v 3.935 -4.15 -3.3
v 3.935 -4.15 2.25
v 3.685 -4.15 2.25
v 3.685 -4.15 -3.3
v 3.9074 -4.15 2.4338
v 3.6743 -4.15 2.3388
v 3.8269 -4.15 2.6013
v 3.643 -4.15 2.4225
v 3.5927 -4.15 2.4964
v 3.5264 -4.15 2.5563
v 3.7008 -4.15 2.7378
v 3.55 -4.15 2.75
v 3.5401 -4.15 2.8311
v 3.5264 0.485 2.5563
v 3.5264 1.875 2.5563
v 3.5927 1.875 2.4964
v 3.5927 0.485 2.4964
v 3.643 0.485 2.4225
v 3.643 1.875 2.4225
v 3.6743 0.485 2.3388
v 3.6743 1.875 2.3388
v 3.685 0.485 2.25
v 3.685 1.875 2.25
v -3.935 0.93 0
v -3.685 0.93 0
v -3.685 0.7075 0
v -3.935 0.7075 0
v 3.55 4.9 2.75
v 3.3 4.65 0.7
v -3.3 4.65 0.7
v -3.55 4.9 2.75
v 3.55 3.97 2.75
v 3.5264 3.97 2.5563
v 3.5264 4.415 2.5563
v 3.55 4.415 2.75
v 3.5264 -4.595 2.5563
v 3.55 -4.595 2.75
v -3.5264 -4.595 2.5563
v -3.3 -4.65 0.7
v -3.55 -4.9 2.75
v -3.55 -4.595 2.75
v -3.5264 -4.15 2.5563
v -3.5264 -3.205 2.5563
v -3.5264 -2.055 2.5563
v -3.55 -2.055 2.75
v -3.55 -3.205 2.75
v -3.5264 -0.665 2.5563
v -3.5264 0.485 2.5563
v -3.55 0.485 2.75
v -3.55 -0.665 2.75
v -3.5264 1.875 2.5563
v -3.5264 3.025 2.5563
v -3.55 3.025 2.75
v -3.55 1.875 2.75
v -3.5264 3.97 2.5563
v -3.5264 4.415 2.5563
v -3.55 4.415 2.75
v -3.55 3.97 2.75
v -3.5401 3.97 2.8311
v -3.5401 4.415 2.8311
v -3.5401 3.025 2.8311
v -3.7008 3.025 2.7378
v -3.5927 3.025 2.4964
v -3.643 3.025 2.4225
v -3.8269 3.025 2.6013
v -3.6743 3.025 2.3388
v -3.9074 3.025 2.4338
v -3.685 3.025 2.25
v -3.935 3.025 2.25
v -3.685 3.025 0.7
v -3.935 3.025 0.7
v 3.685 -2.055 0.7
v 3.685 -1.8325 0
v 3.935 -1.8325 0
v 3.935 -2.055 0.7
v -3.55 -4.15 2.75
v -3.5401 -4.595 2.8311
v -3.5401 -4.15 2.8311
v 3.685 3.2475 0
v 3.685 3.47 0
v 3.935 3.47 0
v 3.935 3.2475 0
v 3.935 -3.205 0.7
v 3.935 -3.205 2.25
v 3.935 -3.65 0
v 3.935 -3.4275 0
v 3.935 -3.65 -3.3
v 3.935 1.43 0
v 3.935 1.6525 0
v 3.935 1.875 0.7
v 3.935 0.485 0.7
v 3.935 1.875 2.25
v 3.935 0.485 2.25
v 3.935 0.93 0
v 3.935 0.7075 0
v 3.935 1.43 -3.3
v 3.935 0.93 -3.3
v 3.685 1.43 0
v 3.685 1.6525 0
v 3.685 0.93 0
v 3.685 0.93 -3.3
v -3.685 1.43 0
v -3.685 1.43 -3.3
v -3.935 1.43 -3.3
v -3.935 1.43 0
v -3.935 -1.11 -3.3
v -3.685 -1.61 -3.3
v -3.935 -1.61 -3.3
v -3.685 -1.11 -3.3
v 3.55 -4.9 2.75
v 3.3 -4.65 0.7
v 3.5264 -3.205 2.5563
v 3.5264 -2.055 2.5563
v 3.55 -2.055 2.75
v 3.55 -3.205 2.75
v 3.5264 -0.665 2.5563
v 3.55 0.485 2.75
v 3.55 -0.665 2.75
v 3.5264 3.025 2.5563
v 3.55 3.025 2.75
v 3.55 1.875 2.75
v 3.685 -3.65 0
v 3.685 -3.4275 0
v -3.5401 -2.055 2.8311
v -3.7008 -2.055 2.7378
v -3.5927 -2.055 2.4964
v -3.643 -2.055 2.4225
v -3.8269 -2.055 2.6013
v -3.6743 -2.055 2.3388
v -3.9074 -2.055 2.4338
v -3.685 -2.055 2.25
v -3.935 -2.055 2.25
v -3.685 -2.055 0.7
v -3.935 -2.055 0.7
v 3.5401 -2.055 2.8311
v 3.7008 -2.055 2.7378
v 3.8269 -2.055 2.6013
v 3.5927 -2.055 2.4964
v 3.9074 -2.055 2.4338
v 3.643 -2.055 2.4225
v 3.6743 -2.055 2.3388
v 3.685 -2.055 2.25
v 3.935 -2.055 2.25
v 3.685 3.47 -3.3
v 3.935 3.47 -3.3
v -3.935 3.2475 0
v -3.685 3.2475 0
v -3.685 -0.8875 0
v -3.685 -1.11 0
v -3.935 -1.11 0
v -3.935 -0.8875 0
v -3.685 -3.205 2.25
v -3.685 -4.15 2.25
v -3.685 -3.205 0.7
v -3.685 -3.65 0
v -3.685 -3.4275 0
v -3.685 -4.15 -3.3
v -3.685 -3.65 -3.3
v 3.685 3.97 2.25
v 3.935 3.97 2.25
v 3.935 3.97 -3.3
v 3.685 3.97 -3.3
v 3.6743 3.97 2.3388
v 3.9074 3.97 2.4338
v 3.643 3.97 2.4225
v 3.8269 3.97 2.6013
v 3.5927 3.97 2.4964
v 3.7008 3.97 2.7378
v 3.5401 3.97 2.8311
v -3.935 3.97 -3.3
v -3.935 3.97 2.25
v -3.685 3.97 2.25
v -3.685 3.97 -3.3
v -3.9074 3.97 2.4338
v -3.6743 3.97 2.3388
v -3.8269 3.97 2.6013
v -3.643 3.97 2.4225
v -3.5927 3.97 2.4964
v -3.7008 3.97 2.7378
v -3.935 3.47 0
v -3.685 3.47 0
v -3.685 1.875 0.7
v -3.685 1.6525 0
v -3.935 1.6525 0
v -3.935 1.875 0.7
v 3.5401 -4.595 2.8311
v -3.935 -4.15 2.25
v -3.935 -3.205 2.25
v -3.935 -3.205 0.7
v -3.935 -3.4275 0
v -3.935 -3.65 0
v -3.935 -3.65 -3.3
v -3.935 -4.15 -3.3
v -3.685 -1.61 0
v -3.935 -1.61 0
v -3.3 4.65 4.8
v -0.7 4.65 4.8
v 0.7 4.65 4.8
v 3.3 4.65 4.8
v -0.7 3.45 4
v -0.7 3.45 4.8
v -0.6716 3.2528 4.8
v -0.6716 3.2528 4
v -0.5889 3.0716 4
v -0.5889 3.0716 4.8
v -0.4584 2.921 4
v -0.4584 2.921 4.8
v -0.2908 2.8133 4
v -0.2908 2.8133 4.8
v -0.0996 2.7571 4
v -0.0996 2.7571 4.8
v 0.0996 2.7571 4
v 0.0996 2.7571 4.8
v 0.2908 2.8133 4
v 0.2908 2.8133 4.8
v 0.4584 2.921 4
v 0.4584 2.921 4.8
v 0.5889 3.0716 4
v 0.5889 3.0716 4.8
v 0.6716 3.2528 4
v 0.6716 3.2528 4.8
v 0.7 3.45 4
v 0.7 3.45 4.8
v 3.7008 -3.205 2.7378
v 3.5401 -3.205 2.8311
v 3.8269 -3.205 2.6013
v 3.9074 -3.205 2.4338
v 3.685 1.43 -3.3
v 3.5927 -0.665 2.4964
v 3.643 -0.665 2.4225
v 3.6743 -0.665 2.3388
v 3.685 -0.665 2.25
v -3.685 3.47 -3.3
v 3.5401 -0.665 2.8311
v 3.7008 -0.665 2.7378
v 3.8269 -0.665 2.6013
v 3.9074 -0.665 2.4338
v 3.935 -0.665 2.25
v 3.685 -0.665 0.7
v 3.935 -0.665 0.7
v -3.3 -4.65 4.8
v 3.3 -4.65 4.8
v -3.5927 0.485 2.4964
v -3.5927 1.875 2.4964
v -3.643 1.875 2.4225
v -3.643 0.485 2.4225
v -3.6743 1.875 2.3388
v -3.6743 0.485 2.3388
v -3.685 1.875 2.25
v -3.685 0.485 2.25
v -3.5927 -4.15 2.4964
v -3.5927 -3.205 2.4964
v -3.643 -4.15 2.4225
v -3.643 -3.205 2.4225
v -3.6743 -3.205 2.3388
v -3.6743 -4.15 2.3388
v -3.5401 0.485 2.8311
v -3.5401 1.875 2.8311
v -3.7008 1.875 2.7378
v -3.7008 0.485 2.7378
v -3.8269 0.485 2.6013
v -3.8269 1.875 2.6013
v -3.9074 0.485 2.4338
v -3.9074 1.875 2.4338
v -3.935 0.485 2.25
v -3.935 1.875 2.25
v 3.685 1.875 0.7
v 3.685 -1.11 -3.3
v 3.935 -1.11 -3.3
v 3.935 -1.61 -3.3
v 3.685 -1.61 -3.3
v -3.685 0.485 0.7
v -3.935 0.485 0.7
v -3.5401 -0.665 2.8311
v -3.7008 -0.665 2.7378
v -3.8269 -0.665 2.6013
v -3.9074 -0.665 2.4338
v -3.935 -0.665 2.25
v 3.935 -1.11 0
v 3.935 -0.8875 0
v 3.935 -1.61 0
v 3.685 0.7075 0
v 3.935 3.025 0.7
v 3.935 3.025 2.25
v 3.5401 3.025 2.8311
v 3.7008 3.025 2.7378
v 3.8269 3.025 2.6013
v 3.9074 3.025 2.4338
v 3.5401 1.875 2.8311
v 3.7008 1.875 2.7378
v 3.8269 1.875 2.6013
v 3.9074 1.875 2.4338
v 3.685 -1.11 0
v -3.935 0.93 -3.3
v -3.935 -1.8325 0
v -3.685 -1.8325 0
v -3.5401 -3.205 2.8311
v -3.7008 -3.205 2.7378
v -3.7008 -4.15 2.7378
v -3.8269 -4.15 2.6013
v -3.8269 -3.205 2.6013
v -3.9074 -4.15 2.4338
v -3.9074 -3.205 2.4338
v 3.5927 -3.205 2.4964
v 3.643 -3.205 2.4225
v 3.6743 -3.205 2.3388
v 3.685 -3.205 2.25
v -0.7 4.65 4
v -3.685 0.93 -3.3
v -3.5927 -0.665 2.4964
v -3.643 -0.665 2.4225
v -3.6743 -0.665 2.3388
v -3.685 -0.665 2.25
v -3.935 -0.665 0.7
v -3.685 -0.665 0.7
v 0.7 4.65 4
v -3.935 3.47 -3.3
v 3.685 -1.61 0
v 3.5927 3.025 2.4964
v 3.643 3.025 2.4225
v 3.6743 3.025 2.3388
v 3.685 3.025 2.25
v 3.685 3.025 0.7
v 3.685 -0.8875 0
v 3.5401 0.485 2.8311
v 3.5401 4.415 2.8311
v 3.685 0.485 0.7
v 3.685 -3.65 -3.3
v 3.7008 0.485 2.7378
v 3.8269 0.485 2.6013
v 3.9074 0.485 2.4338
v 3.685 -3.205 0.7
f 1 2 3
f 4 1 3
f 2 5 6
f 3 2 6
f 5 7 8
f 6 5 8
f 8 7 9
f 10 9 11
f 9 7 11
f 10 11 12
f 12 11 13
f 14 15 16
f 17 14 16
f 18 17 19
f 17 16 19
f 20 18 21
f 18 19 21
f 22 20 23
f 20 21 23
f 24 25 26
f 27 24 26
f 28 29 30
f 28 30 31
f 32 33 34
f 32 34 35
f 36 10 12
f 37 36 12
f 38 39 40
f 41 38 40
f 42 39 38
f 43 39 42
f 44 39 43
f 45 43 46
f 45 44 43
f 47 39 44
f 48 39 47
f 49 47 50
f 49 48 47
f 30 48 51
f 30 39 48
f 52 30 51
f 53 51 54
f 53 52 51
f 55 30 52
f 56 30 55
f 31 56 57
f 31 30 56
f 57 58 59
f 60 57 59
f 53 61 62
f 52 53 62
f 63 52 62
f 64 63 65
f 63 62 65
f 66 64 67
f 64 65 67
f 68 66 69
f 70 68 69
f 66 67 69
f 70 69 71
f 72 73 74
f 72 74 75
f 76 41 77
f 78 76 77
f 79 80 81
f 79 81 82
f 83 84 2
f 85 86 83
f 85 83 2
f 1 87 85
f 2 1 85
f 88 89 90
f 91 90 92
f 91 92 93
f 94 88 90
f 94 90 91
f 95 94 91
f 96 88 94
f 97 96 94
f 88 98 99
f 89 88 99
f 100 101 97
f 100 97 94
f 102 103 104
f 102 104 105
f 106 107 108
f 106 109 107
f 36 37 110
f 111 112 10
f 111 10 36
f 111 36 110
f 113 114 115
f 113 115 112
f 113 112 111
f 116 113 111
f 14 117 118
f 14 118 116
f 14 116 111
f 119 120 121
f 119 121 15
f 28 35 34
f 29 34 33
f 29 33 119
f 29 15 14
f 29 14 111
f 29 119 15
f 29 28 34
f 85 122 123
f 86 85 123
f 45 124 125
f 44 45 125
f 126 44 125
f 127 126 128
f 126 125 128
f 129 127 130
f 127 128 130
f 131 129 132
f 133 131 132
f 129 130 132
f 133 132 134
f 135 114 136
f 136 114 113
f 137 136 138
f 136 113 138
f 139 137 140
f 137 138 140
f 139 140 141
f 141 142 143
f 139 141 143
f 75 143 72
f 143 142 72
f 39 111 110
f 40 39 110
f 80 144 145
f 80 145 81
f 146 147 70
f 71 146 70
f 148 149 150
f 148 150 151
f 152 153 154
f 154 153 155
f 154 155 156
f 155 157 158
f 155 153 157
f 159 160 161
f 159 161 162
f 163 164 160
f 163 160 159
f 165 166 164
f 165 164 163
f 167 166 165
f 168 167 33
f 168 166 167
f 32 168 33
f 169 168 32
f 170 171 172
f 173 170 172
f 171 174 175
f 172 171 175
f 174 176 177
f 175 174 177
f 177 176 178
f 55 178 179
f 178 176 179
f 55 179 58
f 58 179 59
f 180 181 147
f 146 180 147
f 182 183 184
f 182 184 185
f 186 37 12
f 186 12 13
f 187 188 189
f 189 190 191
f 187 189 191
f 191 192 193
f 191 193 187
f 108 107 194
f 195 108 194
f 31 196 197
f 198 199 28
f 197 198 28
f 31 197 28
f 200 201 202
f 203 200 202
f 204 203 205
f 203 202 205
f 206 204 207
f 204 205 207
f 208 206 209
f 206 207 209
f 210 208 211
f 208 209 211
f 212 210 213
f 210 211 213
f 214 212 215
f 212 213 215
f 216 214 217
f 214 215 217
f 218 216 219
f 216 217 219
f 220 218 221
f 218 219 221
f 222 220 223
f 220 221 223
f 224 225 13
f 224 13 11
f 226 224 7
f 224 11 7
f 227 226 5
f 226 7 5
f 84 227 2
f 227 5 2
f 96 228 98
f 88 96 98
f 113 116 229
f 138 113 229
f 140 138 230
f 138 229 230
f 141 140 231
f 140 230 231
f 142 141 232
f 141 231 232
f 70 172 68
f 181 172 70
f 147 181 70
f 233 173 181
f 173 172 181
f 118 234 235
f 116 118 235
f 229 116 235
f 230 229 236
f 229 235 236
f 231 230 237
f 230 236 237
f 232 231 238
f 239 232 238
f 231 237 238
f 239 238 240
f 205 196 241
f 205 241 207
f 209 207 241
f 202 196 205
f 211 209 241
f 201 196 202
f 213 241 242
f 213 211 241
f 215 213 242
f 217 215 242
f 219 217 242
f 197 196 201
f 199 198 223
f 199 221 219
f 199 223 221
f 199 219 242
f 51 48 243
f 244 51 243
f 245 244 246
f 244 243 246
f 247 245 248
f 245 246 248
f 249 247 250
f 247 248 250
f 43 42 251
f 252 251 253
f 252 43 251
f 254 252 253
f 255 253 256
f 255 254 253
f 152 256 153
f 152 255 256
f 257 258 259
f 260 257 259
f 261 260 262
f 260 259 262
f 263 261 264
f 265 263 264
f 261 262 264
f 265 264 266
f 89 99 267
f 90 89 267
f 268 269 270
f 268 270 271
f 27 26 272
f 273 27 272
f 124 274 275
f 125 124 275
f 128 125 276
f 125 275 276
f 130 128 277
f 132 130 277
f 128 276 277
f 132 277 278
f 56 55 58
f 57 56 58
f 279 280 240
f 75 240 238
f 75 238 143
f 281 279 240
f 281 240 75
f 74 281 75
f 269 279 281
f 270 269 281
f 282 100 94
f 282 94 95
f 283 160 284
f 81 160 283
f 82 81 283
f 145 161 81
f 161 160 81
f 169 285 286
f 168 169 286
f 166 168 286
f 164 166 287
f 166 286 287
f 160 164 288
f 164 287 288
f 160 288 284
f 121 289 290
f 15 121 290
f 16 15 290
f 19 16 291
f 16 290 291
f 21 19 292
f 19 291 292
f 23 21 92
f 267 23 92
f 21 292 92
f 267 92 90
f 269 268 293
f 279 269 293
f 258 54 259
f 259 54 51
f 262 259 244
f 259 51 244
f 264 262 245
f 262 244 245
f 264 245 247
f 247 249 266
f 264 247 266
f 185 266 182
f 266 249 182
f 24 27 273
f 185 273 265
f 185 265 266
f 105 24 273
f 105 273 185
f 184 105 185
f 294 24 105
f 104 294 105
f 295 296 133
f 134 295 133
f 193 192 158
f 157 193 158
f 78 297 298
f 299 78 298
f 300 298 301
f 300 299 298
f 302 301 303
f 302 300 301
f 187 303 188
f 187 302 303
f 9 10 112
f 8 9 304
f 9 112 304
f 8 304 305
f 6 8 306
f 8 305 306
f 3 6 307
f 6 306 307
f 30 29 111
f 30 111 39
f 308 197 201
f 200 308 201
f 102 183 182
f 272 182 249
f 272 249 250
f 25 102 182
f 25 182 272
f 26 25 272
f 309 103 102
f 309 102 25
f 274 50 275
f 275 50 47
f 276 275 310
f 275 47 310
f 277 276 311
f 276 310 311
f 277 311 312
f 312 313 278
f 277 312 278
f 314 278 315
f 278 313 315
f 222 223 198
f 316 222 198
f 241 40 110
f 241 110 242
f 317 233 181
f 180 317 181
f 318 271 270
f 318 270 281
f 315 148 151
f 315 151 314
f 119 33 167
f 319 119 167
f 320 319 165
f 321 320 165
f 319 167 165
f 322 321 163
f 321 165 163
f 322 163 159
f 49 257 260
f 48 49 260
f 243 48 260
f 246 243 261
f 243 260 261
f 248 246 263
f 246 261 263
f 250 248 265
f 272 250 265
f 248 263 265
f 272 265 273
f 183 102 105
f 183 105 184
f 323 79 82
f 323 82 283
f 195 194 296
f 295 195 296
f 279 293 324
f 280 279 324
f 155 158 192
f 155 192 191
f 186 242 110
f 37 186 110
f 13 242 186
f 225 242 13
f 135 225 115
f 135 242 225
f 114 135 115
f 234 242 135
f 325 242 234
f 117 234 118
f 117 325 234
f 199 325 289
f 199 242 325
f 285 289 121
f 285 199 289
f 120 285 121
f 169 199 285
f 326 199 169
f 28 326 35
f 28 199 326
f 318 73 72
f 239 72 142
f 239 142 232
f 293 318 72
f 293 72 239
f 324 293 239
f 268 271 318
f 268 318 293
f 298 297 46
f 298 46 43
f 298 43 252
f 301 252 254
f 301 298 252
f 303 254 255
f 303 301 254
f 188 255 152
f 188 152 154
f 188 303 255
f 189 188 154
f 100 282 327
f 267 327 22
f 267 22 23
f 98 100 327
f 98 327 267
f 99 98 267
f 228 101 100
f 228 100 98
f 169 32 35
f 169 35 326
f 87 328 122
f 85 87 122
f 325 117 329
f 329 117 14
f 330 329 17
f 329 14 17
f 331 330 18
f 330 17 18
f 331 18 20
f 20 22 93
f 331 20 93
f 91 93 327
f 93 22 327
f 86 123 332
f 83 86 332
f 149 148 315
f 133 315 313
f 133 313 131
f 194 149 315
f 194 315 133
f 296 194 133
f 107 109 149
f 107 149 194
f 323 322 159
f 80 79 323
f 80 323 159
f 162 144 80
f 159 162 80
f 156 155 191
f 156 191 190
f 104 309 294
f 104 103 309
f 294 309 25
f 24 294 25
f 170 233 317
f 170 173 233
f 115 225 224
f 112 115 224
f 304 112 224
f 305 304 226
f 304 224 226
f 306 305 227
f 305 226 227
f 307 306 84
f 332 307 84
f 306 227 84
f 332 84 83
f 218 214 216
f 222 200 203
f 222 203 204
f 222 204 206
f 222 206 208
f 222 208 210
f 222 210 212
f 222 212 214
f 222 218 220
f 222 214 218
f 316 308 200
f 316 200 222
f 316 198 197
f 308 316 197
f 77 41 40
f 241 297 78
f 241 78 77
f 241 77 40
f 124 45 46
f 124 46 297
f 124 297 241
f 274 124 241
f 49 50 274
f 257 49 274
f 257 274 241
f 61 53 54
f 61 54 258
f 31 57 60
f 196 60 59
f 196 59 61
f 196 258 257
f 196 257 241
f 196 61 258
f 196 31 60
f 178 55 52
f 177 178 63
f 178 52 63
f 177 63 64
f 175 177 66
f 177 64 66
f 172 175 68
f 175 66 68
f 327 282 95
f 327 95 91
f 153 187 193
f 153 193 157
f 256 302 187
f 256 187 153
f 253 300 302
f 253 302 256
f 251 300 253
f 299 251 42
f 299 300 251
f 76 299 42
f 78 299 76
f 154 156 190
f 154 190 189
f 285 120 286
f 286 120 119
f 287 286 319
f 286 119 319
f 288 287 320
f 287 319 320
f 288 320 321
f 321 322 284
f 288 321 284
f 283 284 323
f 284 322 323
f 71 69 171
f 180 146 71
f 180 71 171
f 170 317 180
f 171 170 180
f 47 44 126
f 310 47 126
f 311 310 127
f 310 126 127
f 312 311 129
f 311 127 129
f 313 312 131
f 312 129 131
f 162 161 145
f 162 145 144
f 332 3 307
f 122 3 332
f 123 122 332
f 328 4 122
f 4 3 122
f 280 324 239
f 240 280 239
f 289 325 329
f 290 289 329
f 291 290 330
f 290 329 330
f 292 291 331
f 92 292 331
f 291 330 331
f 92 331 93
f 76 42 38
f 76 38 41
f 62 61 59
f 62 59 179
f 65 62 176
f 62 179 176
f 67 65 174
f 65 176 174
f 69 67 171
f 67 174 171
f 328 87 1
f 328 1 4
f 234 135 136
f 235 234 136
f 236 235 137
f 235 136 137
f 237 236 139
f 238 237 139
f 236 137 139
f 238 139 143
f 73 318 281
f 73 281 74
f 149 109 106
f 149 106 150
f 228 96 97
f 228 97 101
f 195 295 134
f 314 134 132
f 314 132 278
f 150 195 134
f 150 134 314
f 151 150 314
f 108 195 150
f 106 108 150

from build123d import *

# Parameters (mm, degrees)
BASIC_SHAPE_DEPTH              = 4.9
SIDE_PROFILE1_DEPTH            = 4.55
SIDE_PROFILE1_DEPTH_BACK       = 4.55
SIDE_PROFILE2_DEPTH            = 4.55
SIDE_PROFILE2_DEPTH_BACK       = 4.55
LOCATION_MARK_DEPTH            = 0.8
SKETCH6_W                      = 0.25
SKETCH6_H                      = 1.39
PIN_RELIEF_DEPTH               = 1.25
REMAINING_PINS_COUNT           = 4
REMAINING_PINS_PITCH           = 2.54
REMAINING_PINS_COPY_1_SKETCH_W = 0.25
REMAINING_PINS_COPY_1_SKETCH_H = 1.39
REMAINING_PINS_COPY_2_SKETCH_W = 0.25
REMAINING_PINS_COPY_2_SKETCH_H = 1.39
REMAINING_PINS_COPY_3_SKETCH_W = 0.25
REMAINING_PINS_COPY_3_SKETCH_H = 1.39
REMAINING_PINS_COPY_4_DEPTH    = 1.25
REMAINING_PINS_COPY_5_DEPTH    = 1.25
REMAINING_PINS_COPY_6_DEPTH    = 1.25
PIN_SHAPE1_DEPTH               = 0.445
PIN_START                      = -0.445
PIN_SHAPE2_DEPTH               = 0.445


with BuildPart() as part:
    # Sketch1 → Basic Shape (new body, symmetric)
    with BuildSketch(Plane(origin=(0, 0, 0), x_dir=(1, 0, 0), z_dir=(0, 1, 0))):
        Polygon((-3.3, -0.7), (-3.55, -2.75), (-3.3, -4.8), (3.3, -4.8), (3.55, -2.75), (3.3, -0.7), align=None)
    extrude(amount=BASIC_SHAPE_DEPTH, both=True)

    # Sketch2 → Side Profile1 (cut, two sides)
    with BuildSketch(Plane(origin=(0, 0, 0), x_dir=(0, 0, -1), z_dir=(1, 0, 0))) as side_profile1_sk:
        Polygon((-4.8, 4.9), (-4.8, 4.65), (-2.75, 4.9), align=None)
        Polygon((-4.8, -4.9), (-2.75, -4.9), (-4.8, -4.65), align=None)
    extrude(amount=SIDE_PROFILE1_DEPTH, mode=Mode.SUBTRACT)
    extrude(side_profile1_sk.sketch, amount=-SIDE_PROFILE1_DEPTH_BACK, mode=Mode.SUBTRACT)

    # Sketch3 → Side Profile2 (cut, two sides)
    with BuildSketch(Plane(origin=(0, 0, 0), x_dir=(0, 0, -1), z_dir=(1, 0, 0))) as side_profile2_sk:
        Polygon((-2.75, 4.9), (-0.7, 4.9), (-0.7, 4.65), align=None)
        Polygon((-2.75, -4.9), (-0.7, -4.9), (-0.7, -4.65), align=None)
    extrude(amount=SIDE_PROFILE2_DEPTH, mode=Mode.SUBTRACT)
    extrude(side_profile2_sk.sketch, amount=-SIDE_PROFILE2_DEPTH_BACK, mode=Mode.SUBTRACT)

    # Sketch4 → Location Mark (cut)
    with BuildSketch(Plane(origin=(0, 0, 4.8), x_dir=(-1, 0, 0), z_dir=(0, 0, -1))):
        with BuildLine():
            Line((0.7, 4.65), (0.7, 3.45))
            ThreePointArc((0.7, 3.45), (0, 2.75), (-0.7, 3.45))
            Line((-0.7, 3.45), (-0.7, 4.65))
            Line((-0.7, 4.65), (0.7, 4.65))
        make_face()
    extrude(amount=LOCATION_MARK_DEPTH, mode=Mode.SUBTRACT)

    # First Pin: sweep along a path in Sketch5
    with BuildLine(Plane(origin=(0, -3.9, 0), x_dir=(1, 0, 0), z_dir=(0, 1, 0))) as first_pin_path:
        Line((0, -2.75), (3.31, -2.75))
        ThreePointArc((3.31, -2.75), (3.663553391, -2.603553391), (3.81, -2.25))
        Line((3.81, -2.25), (3.81, 3.3))
    # Sketch6 → First Pin (sweep)
    with BuildSketch(Plane(origin=(0, 0, 0), x_dir=(0, 0, -1), z_dir=(1, 0, 0))):
        with Locations((-2.75, -3.9)):
            Rectangle(SKETCH6_W, SKETCH6_H)
    first_pin = sweep(path=first_pin_path.line)

    # Sketch7 → Pin Relief (cut, through all)
    with BuildSketch(Plane.ZY.offset(-3.685)):
        Polygon((-3.3, -4.15), (0, -4.15), (0, -4.3725), (0.7, -4.595), (-3.3, -4.595), align=None)
        Polygon((-3.3, -3.65), (0, -3.65), (0, -3.4275), (0.7, -3.205), (-3.3, -3.205), align=None)
    pin_relief = extrude(amount=-PIN_RELIEF_DEPTH, mode=Mode.SUBTRACT)

    # Opp Pin: First Pin, Pin Relief across plane
    add(first_pin.mirror(Plane(origin=(0, 0, 0), x_dir=(0, 0, 1), z_dir=(1, 0, 0))))
    add(pin_relief.mirror(Plane(origin=(0, 0, 0), x_dir=(0, 0, 1), z_dir=(1, 0, 0))), mode=Mode.SUBTRACT)

    # Remaining Pins: First Pin, Pin Relief ×4
    with Locations(*[(0, i * REMAINING_PINS_PITCH, 0) for i in range(1, REMAINING_PINS_COUNT)]):
        add(first_pin)
        add(pin_relief, mode=Mode.SUBTRACT)

    # Remaining Pins copy 1: sweep along a path in Remaining Pins copy 1 path
    with BuildLine(Plane(origin=(0, -1.36, 0), x_dir=(-1, 0, 0), z_dir=(0, 1, 0))) as remaining_pins_copy_1_path:
        Line((0, 2.75), (3.31, 2.75))
        ThreePointArc((3.31, 2.75), (3.663553391, 2.603553391), (3.81, 2.25))
        Line((3.81, 2.25), (3.81, -3.3))
    # Remaining Pins copy 1 sketch → Remaining Pins copy 1 (sweep)
    with BuildSketch(Plane(origin=(0, 2.54, 0), x_dir=(0, 0, -1), z_dir=(-1, 0, 0))):
        with Locations((-2.75, 3.9)):
            Rectangle(REMAINING_PINS_COPY_1_SKETCH_W, REMAINING_PINS_COPY_1_SKETCH_H)
    sweep(path=remaining_pins_copy_1_path.line)

    # Remaining Pins copy 2: sweep along a path in Remaining Pins copy 2 path
    with BuildLine(Plane(origin=(0, 1.18, 0), x_dir=(-1, 0, 0), z_dir=(0, 1, 0))) as remaining_pins_copy_2_path:
        Line((0, 2.75), (3.31, 2.75))
        ThreePointArc((3.31, 2.75), (3.663553391, 2.603553391), (3.81, 2.25))
        Line((3.81, 2.25), (3.81, -3.3))
    # Remaining Pins copy 2 sketch → Remaining Pins copy 2 (sweep)
    with BuildSketch(Plane(origin=(0, 5.08, 0), x_dir=(0, 0, -1), z_dir=(-1, 0, 0))):
        with Locations((-2.75, 3.9)):
            Rectangle(REMAINING_PINS_COPY_2_SKETCH_W, REMAINING_PINS_COPY_2_SKETCH_H)
    sweep(path=remaining_pins_copy_2_path.line)

    # Remaining Pins copy 3: sweep along a path in Remaining Pins copy 3 path
    with BuildLine(Plane(origin=(0, 3.72, 0), x_dir=(-1, 0, 0), z_dir=(0, 1, 0))) as remaining_pins_copy_3_path:
        Line((0, 2.75), (3.31, 2.75))
        ThreePointArc((3.31, 2.75), (3.663553391, 2.603553391), (3.81, 2.25))
        Line((3.81, 2.25), (3.81, -3.3))
    # Remaining Pins copy 3 sketch → Remaining Pins copy 3 (sweep)
    with BuildSketch(Plane(origin=(0, 7.62, 0), x_dir=(0, 0, -1), z_dir=(-1, 0, 0))):
        with Locations((-2.75, 3.9)):
            Rectangle(REMAINING_PINS_COPY_3_SKETCH_W, REMAINING_PINS_COPY_3_SKETCH_H)
    sweep(path=remaining_pins_copy_3_path.line)

    # Remaining Pins copy 4 sketch → Remaining Pins copy 4 (cut, through all)
    with BuildSketch(Plane(origin=(-3.685, 2.54, 0), x_dir=(0, 0, 1), z_dir=(1, 0, 0))):
        Polygon((-3.3, 4.15), (0, 4.15), (0, 4.3725), (0.7, 4.595), (-3.3, 4.595), align=None)
        Polygon((-3.3, 3.65), (0, 3.65), (0, 3.4275), (0.7, 3.205), (-3.3, 3.205), align=None)
    extrude(amount=-REMAINING_PINS_COPY_4_DEPTH, mode=Mode.SUBTRACT)

    # Remaining Pins copy 5 sketch → Remaining Pins copy 5 (cut, through all)
    with BuildSketch(Plane(origin=(-3.685, 5.08, 0), x_dir=(0, 0, 1), z_dir=(1, 0, 0))):
        Polygon((-3.3, 4.15), (0, 4.15), (0, 4.3725), (0.7, 4.595), (-3.3, 4.595), align=None)
        Polygon((-3.3, 3.65), (0, 3.65), (0, 3.4275), (0.7, 3.205), (-3.3, 3.205), align=None)
    extrude(amount=-REMAINING_PINS_COPY_5_DEPTH, mode=Mode.SUBTRACT)

    # Remaining Pins copy 6 sketch → Remaining Pins copy 6 (cut, through all)
    with BuildSketch(Plane(origin=(-3.685, 7.62, 0), x_dir=(0, 0, 1), z_dir=(1, 0, 0))):
        Polygon((-3.3, 4.15), (0, 4.15), (0, 4.3725), (0.7, 4.595), (-3.3, 4.595), align=None)
        Polygon((-3.3, 3.65), (0, 3.65), (0, 3.4275), (0.7, 3.205), (-3.3, 3.205), align=None)
    extrude(amount=-REMAINING_PINS_COPY_6_DEPTH, mode=Mode.SUBTRACT)

    # Sketch9 → Pin Shape1 (cut)
    with BuildSketch(Plane.XZ.offset(4.595)):
        with BuildLine():
            Line((3.935, 0), (3.685, 0))
            Line((3.685, 0), (3.685, 2.25))
            ThreePointArc((3.685, 2.25), (3.642990838, 2.422458987), (3.526375455, 2.556278733))
            Line((3.526375455, 2.556278733), (3.55, 2.75))
            Line((3.55, 2.75), (3.540110055, 2.83109755))
            ThreePointArc((3.540110055, 2.83109755), (3.826935095, 2.601287785), (3.935, 2.25))
            Line((3.935, 2.25), (3.935, 0))
        make_face()
        with BuildLine():
            Line((-3.935, 0), (-3.685, 0))
            Line((-3.685, 0), (-3.685, 2.25))
            ThreePointArc((-3.685, 2.25), (-3.642990838, 2.422458987), (-3.526375455, 2.556278733))
            Line((-3.526375455, 2.556278733), (-3.55, 2.75))
            Line((-3.55, 2.75), (-3.540110055, 2.83109755))
            ThreePointArc((-3.540110055, 2.83109755), (-3.826935095, 2.601287785), (-3.935, 2.25))
            Line((-3.935, 2.25), (-3.935, 0))
        make_face()
    extrude(amount=-PIN_SHAPE1_DEPTH, mode=Mode.SUBTRACT)

    # Sketch10 → Pin Shape2 (cut)
    with BuildSketch(Plane(origin=(0, 4.415, 0), x_dir=(-1, 0, 0), z_dir=(0, 1, 0)).offset(PIN_START)):
        with BuildLine():
            Line((-3.935, 0), (-3.685, 0))
            Line((-3.685, 0), (-3.685, 2.25))
            ThreePointArc((-3.685, 2.25), (-3.642990838, 2.422458987), (-3.526375455, 2.556278733))
            Line((-3.526375455, 2.556278733), (-3.55, 2.75))
            Line((-3.55, 2.75), (-3.540110055, 2.83109755))
            ThreePointArc((-3.540110055, 2.83109755), (-3.826935095, 2.601287785), (-3.935, 2.25))
            Line((-3.935, 2.25), (-3.935, 0))
        make_face()
        with BuildLine():
            Line((3.935, 0), (3.685, 0))
            Line((3.685, 0), (3.685, 2.25))
            ThreePointArc((3.685, 2.25), (3.642990838, 2.422458987), (3.526375455, 2.556278733))
            Line((3.526375455, 2.556278733), (3.55, 2.75))
            Line((3.55, 2.75), (3.540110055, 2.83109755))
            ThreePointArc((3.540110055, 2.83109755), (3.826935095, 2.601287785), (3.935, 2.25))
            Line((3.935, 2.25), (3.935, 0))
        make_face()
    extrude(amount=PIN_SHAPE2_DEPTH, mode=Mode.SUBTRACT)


solid = part.part
